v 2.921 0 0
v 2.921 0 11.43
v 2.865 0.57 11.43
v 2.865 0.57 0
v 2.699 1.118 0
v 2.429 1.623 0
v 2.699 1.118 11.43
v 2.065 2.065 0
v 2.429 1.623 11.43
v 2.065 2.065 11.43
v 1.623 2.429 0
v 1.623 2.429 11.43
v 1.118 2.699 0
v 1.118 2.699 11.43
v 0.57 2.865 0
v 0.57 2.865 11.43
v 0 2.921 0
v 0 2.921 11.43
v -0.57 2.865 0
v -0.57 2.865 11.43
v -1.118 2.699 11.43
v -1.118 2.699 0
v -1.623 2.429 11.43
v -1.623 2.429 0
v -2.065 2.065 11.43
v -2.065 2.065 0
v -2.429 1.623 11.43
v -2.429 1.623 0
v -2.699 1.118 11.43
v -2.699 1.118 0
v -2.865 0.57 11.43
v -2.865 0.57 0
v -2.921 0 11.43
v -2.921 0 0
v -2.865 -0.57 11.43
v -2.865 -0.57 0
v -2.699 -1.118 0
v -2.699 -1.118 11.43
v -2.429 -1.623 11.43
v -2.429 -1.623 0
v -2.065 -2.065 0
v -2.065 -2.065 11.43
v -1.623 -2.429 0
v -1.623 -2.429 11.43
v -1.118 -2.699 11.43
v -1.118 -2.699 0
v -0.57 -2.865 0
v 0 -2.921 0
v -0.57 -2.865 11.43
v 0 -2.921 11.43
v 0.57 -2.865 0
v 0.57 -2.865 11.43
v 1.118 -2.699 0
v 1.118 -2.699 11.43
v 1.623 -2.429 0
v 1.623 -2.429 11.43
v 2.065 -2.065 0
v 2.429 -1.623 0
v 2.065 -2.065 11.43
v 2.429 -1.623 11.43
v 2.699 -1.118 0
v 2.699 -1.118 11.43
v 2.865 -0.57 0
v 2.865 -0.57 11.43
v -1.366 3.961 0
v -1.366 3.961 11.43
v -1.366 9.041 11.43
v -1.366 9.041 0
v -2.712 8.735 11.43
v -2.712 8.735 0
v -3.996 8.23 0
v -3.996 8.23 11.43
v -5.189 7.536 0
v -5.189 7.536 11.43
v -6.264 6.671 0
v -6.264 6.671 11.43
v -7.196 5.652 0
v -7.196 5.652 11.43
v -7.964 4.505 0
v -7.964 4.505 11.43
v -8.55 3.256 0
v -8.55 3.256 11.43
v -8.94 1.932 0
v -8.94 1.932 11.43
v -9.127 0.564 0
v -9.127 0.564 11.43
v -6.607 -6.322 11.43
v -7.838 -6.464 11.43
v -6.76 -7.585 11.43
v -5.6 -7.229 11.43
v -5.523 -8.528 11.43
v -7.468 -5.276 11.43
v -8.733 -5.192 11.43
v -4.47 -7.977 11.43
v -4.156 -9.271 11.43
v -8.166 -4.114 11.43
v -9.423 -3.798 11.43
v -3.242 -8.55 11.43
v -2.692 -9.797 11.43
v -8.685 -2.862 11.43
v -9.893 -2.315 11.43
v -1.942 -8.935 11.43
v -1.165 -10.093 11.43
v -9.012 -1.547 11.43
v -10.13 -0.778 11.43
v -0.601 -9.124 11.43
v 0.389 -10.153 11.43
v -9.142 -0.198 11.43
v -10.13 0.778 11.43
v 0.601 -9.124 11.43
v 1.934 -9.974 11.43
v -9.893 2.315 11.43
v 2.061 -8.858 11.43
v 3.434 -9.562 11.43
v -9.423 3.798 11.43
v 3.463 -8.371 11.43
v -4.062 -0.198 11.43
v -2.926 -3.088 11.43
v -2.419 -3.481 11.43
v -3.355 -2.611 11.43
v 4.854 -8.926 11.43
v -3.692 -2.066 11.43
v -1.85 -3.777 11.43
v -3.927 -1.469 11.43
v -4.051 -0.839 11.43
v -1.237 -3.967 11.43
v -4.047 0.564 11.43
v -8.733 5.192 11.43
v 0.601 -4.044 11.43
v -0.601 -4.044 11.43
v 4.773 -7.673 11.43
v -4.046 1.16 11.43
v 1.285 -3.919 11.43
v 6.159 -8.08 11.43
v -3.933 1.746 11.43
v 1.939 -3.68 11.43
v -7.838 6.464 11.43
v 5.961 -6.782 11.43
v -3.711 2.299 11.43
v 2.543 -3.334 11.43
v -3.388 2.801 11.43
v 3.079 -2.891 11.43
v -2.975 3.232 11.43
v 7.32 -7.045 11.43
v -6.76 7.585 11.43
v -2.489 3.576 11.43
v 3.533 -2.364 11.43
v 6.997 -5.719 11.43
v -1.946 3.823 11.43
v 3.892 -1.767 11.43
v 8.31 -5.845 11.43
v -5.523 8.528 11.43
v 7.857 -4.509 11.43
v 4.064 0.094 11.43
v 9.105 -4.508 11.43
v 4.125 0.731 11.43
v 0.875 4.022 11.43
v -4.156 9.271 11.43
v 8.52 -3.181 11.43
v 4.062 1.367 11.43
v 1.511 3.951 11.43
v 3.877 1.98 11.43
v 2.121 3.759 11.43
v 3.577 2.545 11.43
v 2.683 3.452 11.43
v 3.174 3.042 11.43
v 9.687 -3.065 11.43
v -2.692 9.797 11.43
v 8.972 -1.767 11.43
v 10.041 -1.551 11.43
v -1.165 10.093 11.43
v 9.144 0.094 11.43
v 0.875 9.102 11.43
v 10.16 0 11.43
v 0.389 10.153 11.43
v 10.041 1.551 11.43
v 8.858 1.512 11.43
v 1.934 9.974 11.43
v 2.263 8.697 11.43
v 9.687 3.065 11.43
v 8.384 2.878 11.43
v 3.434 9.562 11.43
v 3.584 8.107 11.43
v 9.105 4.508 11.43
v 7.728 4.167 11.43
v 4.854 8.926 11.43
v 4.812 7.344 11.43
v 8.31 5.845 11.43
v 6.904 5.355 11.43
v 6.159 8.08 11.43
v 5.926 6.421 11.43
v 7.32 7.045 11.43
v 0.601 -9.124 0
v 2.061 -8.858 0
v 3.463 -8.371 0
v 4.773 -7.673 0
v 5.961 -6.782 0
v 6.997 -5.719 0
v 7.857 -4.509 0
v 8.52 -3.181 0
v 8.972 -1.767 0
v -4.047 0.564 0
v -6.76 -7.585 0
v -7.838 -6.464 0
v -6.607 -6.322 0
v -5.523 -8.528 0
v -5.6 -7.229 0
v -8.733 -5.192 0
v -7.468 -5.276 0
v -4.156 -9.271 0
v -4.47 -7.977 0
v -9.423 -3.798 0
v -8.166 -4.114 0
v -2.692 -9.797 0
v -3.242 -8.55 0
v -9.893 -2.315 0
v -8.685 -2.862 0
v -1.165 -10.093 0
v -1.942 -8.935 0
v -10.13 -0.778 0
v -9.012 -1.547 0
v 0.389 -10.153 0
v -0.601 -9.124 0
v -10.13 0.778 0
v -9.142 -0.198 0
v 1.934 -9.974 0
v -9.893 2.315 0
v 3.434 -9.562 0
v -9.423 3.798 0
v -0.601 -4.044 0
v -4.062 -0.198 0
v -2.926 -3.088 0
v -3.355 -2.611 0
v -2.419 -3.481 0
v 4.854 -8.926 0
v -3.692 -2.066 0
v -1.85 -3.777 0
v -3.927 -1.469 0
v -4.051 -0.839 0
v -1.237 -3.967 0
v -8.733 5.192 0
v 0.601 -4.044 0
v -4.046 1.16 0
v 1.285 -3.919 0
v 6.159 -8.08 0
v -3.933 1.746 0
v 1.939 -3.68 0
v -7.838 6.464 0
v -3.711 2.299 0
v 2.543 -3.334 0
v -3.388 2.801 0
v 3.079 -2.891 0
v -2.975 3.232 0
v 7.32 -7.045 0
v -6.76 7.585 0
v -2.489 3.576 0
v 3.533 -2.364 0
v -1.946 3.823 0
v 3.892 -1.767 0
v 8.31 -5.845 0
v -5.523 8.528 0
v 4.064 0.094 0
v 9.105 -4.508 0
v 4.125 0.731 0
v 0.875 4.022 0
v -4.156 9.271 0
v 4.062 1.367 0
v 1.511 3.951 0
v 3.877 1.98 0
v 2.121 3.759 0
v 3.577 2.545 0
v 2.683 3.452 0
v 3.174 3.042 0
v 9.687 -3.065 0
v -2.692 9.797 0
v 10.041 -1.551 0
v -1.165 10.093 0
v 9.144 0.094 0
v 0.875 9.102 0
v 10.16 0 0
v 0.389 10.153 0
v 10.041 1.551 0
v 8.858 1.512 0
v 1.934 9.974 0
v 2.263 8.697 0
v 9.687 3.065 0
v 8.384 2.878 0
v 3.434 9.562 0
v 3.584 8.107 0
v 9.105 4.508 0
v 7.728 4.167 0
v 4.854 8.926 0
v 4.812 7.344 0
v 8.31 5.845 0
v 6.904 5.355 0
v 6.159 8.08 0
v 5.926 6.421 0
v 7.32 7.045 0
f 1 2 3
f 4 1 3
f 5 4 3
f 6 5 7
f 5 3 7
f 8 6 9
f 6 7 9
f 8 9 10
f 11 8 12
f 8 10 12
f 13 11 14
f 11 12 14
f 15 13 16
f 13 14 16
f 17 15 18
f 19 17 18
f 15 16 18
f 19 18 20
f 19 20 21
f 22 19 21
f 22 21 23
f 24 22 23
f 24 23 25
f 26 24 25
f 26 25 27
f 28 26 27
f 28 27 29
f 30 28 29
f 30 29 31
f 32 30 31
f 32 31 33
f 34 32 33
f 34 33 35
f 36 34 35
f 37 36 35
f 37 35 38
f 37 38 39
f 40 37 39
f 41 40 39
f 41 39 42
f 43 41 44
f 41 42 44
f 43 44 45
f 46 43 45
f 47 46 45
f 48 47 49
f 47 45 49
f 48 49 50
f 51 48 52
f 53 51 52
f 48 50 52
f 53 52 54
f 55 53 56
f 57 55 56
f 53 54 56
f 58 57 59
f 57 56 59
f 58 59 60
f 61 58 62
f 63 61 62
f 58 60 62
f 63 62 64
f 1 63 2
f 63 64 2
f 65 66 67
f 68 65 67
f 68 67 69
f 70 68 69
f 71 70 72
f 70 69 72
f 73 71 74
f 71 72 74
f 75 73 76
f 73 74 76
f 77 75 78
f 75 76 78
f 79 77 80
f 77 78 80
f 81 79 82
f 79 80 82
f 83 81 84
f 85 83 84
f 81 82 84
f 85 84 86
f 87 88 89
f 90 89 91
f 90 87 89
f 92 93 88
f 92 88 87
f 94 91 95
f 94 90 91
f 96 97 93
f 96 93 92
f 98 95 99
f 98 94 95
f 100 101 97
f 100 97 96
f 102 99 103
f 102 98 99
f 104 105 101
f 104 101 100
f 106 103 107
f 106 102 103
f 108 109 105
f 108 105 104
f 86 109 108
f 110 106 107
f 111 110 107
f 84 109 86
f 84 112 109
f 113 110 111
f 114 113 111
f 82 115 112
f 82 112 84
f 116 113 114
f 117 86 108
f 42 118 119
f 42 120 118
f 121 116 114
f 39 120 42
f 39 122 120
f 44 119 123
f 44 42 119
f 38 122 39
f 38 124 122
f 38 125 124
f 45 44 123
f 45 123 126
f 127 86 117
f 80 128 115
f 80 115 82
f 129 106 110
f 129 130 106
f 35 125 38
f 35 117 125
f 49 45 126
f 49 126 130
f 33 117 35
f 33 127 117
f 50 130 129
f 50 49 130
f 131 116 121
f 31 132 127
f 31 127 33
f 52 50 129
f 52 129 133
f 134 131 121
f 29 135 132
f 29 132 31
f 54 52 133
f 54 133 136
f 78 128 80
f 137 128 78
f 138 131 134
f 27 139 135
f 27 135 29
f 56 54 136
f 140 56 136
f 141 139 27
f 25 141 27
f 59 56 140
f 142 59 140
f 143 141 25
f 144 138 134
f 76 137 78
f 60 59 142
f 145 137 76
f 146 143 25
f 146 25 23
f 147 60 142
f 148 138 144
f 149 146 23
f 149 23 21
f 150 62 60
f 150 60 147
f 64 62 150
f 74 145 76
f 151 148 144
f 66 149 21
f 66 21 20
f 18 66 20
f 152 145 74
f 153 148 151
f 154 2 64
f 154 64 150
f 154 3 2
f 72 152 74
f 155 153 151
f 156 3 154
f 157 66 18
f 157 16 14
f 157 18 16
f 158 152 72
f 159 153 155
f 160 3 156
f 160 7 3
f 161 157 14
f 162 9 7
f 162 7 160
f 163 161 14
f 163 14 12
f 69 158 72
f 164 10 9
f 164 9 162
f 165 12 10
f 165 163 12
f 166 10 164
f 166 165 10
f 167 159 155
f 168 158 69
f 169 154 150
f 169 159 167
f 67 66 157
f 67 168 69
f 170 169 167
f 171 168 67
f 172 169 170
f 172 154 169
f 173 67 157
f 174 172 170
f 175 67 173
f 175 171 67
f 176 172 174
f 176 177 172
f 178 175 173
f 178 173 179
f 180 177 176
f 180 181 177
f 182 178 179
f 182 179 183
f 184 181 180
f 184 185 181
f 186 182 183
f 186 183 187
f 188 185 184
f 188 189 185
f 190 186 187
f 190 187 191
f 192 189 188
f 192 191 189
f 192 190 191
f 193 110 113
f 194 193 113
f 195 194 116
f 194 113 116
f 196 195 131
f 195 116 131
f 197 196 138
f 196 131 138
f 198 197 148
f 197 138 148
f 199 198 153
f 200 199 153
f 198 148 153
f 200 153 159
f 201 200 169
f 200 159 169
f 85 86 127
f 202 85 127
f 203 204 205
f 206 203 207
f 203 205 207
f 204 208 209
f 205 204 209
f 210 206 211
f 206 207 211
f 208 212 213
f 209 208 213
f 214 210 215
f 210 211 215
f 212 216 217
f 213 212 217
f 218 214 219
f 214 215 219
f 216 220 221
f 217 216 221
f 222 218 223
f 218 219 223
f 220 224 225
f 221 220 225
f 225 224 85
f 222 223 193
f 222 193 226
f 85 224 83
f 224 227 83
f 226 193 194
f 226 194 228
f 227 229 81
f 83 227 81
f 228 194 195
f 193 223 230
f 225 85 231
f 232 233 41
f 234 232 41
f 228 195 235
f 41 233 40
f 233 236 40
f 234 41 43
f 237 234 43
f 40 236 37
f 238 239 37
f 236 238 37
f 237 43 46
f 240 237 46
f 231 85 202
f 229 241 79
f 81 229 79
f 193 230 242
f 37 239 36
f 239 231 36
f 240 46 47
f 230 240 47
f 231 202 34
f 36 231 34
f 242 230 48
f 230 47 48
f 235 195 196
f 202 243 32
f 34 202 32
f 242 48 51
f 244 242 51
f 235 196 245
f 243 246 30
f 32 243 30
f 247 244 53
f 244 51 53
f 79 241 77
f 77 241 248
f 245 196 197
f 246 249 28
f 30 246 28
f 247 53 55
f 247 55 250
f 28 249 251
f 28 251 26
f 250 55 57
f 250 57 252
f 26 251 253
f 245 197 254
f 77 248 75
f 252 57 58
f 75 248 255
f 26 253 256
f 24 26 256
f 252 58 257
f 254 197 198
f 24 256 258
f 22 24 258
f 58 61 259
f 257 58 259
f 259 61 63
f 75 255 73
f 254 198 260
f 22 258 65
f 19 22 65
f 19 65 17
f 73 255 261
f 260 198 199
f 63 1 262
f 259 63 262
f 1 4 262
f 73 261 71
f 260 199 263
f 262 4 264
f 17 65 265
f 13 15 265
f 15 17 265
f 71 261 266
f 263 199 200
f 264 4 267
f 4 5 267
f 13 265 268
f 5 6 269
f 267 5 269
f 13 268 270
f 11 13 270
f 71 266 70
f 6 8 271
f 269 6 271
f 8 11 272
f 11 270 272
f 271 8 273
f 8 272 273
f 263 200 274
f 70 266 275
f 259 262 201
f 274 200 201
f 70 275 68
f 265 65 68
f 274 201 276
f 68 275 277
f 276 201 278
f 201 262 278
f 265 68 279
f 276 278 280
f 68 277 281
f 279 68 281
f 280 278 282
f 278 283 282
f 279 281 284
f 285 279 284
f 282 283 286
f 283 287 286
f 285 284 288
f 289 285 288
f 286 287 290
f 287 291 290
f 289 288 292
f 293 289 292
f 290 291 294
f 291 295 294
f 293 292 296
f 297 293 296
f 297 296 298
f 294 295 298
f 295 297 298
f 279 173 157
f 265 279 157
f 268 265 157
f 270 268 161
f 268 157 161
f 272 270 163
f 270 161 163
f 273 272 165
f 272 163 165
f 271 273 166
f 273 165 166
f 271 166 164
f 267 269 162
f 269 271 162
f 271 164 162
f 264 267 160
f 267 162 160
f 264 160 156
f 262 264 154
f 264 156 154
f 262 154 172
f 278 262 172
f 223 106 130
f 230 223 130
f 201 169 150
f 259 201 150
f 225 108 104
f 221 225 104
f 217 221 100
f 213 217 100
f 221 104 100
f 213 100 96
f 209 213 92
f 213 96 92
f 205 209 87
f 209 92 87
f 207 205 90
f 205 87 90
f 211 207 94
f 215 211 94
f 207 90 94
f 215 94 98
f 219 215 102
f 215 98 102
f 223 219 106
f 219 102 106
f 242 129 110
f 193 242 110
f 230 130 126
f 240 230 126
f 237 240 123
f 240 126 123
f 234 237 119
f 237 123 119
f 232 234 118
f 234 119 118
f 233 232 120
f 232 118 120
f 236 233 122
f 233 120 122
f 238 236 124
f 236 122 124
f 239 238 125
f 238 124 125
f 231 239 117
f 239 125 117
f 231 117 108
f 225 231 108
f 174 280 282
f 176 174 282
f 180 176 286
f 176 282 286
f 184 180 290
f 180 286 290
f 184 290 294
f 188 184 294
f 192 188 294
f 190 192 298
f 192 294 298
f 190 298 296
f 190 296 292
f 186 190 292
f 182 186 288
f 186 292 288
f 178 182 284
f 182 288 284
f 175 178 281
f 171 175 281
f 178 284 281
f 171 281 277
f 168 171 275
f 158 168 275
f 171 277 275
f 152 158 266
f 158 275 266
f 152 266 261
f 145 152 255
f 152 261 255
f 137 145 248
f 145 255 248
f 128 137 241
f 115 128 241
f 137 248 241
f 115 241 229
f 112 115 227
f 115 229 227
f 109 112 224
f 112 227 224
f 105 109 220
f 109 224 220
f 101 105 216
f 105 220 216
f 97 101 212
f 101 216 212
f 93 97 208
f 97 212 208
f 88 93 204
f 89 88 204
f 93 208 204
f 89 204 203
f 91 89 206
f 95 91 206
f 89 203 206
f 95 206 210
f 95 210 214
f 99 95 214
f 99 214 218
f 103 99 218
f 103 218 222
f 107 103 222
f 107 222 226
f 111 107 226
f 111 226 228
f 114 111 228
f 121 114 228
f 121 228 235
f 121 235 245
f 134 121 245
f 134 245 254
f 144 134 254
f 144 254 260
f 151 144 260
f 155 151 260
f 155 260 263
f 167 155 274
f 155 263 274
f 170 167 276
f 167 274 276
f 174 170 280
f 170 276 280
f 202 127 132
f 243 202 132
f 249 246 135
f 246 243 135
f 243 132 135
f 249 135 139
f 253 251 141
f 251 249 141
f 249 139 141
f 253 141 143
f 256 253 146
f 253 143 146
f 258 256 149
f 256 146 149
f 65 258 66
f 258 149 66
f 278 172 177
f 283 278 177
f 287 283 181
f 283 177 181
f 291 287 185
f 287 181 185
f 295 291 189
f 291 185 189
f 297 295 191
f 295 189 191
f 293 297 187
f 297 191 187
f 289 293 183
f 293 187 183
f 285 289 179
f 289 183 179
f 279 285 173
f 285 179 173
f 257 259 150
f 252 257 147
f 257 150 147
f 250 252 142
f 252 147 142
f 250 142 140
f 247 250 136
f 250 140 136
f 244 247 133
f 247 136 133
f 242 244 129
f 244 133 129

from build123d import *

# Parameters (mm, degrees)
F0_R     = 10.16
F1_DEPTH = 11.43
F2_R     = 2.921
F3_DEPTH = 25.4
F5_DEPTH = 25.4
F7_DEPTH = 25.4


with BuildPart() as f1:
    # F0 (on Top) → F1 (new body)
    with BuildSketch(Plane.XY):
        Circle(F0_R)
    extrude(amount=F1_DEPTH)

    # F2 (on face) → F3 (cut)
    with BuildSketch(Plane.XY.offset(11.43)):
        Circle(F2_R)
    extrude(amount=-F3_DEPTH, mode=Mode.SUBTRACT)

    # F4 (on face) → F5 (cut)
    with BuildSketch(Plane.XY.offset(11.43)):
        with BuildLine():
            Line((-0.600534, -9.124259), (-0.600534, -4.044259))
            ThreePointArc((-0.600534, -4.044259), (-3.151262, -2.859133), (-4.061856, -0.198015))
            Line((-4.061856, -0.198015), (-9.141856, -0.198015))
            ThreePointArc((-9.141856, -0.198015), (-6.606663, -6.321767), (-0.600534, -9.124259))
        make_face()
    extrude(amount=-F5_DEPTH, mode=Mode.SUBTRACT)

    # F6 (on face) → F7 (cut)
    with BuildSketch(Plane.XY.offset(11.43)):
        with BuildLine():
            ThreePointArc((3.891585, -1.767314), (2.542541, -3.334315), (0.600534, -4.044259))
            Line((0.600534, -4.044259), (0.600534, -9.124259))
            ThreePointArc((0.600534, -9.124259), (5.960667, -6.782305), (8.971585, -1.767314))
            Line((8.971585, -1.767314), (3.891585, -1.767314))
        make_face()
        with BuildLine():
            ThreePointArc((0.874891, 4.022049), (3.387925, 2.803616), (4.06352, 0.093727))
            Line((4.06352, 0.093727), (9.14352, 0.093727))
            ThreePointArc((9.14352, 0.093727), (6.432661, 5.904461), (0.874891, 9.102049))
            Line((0.874891, 9.102049), (0.874891, 4.022049))
        make_face()
        with BuildLine():
            ThreePointArc((-4.046591, 0.563985), (-3.387877, 2.800717), (-1.365609, 3.961452))
            Line((-1.365609, 3.961452), (-1.365609, 9.041452))
            ThreePointArc((-1.365609, 9.041452), (-6.7496, 6.179148), (-9.126591, 0.563985))
            Line((-9.126591, 0.563985), (-4.046591, 0.563985))
        make_face()
    extrude(amount=-F7_DEPTH, mode=Mode.SUBTRACT)


solid = f1.part
